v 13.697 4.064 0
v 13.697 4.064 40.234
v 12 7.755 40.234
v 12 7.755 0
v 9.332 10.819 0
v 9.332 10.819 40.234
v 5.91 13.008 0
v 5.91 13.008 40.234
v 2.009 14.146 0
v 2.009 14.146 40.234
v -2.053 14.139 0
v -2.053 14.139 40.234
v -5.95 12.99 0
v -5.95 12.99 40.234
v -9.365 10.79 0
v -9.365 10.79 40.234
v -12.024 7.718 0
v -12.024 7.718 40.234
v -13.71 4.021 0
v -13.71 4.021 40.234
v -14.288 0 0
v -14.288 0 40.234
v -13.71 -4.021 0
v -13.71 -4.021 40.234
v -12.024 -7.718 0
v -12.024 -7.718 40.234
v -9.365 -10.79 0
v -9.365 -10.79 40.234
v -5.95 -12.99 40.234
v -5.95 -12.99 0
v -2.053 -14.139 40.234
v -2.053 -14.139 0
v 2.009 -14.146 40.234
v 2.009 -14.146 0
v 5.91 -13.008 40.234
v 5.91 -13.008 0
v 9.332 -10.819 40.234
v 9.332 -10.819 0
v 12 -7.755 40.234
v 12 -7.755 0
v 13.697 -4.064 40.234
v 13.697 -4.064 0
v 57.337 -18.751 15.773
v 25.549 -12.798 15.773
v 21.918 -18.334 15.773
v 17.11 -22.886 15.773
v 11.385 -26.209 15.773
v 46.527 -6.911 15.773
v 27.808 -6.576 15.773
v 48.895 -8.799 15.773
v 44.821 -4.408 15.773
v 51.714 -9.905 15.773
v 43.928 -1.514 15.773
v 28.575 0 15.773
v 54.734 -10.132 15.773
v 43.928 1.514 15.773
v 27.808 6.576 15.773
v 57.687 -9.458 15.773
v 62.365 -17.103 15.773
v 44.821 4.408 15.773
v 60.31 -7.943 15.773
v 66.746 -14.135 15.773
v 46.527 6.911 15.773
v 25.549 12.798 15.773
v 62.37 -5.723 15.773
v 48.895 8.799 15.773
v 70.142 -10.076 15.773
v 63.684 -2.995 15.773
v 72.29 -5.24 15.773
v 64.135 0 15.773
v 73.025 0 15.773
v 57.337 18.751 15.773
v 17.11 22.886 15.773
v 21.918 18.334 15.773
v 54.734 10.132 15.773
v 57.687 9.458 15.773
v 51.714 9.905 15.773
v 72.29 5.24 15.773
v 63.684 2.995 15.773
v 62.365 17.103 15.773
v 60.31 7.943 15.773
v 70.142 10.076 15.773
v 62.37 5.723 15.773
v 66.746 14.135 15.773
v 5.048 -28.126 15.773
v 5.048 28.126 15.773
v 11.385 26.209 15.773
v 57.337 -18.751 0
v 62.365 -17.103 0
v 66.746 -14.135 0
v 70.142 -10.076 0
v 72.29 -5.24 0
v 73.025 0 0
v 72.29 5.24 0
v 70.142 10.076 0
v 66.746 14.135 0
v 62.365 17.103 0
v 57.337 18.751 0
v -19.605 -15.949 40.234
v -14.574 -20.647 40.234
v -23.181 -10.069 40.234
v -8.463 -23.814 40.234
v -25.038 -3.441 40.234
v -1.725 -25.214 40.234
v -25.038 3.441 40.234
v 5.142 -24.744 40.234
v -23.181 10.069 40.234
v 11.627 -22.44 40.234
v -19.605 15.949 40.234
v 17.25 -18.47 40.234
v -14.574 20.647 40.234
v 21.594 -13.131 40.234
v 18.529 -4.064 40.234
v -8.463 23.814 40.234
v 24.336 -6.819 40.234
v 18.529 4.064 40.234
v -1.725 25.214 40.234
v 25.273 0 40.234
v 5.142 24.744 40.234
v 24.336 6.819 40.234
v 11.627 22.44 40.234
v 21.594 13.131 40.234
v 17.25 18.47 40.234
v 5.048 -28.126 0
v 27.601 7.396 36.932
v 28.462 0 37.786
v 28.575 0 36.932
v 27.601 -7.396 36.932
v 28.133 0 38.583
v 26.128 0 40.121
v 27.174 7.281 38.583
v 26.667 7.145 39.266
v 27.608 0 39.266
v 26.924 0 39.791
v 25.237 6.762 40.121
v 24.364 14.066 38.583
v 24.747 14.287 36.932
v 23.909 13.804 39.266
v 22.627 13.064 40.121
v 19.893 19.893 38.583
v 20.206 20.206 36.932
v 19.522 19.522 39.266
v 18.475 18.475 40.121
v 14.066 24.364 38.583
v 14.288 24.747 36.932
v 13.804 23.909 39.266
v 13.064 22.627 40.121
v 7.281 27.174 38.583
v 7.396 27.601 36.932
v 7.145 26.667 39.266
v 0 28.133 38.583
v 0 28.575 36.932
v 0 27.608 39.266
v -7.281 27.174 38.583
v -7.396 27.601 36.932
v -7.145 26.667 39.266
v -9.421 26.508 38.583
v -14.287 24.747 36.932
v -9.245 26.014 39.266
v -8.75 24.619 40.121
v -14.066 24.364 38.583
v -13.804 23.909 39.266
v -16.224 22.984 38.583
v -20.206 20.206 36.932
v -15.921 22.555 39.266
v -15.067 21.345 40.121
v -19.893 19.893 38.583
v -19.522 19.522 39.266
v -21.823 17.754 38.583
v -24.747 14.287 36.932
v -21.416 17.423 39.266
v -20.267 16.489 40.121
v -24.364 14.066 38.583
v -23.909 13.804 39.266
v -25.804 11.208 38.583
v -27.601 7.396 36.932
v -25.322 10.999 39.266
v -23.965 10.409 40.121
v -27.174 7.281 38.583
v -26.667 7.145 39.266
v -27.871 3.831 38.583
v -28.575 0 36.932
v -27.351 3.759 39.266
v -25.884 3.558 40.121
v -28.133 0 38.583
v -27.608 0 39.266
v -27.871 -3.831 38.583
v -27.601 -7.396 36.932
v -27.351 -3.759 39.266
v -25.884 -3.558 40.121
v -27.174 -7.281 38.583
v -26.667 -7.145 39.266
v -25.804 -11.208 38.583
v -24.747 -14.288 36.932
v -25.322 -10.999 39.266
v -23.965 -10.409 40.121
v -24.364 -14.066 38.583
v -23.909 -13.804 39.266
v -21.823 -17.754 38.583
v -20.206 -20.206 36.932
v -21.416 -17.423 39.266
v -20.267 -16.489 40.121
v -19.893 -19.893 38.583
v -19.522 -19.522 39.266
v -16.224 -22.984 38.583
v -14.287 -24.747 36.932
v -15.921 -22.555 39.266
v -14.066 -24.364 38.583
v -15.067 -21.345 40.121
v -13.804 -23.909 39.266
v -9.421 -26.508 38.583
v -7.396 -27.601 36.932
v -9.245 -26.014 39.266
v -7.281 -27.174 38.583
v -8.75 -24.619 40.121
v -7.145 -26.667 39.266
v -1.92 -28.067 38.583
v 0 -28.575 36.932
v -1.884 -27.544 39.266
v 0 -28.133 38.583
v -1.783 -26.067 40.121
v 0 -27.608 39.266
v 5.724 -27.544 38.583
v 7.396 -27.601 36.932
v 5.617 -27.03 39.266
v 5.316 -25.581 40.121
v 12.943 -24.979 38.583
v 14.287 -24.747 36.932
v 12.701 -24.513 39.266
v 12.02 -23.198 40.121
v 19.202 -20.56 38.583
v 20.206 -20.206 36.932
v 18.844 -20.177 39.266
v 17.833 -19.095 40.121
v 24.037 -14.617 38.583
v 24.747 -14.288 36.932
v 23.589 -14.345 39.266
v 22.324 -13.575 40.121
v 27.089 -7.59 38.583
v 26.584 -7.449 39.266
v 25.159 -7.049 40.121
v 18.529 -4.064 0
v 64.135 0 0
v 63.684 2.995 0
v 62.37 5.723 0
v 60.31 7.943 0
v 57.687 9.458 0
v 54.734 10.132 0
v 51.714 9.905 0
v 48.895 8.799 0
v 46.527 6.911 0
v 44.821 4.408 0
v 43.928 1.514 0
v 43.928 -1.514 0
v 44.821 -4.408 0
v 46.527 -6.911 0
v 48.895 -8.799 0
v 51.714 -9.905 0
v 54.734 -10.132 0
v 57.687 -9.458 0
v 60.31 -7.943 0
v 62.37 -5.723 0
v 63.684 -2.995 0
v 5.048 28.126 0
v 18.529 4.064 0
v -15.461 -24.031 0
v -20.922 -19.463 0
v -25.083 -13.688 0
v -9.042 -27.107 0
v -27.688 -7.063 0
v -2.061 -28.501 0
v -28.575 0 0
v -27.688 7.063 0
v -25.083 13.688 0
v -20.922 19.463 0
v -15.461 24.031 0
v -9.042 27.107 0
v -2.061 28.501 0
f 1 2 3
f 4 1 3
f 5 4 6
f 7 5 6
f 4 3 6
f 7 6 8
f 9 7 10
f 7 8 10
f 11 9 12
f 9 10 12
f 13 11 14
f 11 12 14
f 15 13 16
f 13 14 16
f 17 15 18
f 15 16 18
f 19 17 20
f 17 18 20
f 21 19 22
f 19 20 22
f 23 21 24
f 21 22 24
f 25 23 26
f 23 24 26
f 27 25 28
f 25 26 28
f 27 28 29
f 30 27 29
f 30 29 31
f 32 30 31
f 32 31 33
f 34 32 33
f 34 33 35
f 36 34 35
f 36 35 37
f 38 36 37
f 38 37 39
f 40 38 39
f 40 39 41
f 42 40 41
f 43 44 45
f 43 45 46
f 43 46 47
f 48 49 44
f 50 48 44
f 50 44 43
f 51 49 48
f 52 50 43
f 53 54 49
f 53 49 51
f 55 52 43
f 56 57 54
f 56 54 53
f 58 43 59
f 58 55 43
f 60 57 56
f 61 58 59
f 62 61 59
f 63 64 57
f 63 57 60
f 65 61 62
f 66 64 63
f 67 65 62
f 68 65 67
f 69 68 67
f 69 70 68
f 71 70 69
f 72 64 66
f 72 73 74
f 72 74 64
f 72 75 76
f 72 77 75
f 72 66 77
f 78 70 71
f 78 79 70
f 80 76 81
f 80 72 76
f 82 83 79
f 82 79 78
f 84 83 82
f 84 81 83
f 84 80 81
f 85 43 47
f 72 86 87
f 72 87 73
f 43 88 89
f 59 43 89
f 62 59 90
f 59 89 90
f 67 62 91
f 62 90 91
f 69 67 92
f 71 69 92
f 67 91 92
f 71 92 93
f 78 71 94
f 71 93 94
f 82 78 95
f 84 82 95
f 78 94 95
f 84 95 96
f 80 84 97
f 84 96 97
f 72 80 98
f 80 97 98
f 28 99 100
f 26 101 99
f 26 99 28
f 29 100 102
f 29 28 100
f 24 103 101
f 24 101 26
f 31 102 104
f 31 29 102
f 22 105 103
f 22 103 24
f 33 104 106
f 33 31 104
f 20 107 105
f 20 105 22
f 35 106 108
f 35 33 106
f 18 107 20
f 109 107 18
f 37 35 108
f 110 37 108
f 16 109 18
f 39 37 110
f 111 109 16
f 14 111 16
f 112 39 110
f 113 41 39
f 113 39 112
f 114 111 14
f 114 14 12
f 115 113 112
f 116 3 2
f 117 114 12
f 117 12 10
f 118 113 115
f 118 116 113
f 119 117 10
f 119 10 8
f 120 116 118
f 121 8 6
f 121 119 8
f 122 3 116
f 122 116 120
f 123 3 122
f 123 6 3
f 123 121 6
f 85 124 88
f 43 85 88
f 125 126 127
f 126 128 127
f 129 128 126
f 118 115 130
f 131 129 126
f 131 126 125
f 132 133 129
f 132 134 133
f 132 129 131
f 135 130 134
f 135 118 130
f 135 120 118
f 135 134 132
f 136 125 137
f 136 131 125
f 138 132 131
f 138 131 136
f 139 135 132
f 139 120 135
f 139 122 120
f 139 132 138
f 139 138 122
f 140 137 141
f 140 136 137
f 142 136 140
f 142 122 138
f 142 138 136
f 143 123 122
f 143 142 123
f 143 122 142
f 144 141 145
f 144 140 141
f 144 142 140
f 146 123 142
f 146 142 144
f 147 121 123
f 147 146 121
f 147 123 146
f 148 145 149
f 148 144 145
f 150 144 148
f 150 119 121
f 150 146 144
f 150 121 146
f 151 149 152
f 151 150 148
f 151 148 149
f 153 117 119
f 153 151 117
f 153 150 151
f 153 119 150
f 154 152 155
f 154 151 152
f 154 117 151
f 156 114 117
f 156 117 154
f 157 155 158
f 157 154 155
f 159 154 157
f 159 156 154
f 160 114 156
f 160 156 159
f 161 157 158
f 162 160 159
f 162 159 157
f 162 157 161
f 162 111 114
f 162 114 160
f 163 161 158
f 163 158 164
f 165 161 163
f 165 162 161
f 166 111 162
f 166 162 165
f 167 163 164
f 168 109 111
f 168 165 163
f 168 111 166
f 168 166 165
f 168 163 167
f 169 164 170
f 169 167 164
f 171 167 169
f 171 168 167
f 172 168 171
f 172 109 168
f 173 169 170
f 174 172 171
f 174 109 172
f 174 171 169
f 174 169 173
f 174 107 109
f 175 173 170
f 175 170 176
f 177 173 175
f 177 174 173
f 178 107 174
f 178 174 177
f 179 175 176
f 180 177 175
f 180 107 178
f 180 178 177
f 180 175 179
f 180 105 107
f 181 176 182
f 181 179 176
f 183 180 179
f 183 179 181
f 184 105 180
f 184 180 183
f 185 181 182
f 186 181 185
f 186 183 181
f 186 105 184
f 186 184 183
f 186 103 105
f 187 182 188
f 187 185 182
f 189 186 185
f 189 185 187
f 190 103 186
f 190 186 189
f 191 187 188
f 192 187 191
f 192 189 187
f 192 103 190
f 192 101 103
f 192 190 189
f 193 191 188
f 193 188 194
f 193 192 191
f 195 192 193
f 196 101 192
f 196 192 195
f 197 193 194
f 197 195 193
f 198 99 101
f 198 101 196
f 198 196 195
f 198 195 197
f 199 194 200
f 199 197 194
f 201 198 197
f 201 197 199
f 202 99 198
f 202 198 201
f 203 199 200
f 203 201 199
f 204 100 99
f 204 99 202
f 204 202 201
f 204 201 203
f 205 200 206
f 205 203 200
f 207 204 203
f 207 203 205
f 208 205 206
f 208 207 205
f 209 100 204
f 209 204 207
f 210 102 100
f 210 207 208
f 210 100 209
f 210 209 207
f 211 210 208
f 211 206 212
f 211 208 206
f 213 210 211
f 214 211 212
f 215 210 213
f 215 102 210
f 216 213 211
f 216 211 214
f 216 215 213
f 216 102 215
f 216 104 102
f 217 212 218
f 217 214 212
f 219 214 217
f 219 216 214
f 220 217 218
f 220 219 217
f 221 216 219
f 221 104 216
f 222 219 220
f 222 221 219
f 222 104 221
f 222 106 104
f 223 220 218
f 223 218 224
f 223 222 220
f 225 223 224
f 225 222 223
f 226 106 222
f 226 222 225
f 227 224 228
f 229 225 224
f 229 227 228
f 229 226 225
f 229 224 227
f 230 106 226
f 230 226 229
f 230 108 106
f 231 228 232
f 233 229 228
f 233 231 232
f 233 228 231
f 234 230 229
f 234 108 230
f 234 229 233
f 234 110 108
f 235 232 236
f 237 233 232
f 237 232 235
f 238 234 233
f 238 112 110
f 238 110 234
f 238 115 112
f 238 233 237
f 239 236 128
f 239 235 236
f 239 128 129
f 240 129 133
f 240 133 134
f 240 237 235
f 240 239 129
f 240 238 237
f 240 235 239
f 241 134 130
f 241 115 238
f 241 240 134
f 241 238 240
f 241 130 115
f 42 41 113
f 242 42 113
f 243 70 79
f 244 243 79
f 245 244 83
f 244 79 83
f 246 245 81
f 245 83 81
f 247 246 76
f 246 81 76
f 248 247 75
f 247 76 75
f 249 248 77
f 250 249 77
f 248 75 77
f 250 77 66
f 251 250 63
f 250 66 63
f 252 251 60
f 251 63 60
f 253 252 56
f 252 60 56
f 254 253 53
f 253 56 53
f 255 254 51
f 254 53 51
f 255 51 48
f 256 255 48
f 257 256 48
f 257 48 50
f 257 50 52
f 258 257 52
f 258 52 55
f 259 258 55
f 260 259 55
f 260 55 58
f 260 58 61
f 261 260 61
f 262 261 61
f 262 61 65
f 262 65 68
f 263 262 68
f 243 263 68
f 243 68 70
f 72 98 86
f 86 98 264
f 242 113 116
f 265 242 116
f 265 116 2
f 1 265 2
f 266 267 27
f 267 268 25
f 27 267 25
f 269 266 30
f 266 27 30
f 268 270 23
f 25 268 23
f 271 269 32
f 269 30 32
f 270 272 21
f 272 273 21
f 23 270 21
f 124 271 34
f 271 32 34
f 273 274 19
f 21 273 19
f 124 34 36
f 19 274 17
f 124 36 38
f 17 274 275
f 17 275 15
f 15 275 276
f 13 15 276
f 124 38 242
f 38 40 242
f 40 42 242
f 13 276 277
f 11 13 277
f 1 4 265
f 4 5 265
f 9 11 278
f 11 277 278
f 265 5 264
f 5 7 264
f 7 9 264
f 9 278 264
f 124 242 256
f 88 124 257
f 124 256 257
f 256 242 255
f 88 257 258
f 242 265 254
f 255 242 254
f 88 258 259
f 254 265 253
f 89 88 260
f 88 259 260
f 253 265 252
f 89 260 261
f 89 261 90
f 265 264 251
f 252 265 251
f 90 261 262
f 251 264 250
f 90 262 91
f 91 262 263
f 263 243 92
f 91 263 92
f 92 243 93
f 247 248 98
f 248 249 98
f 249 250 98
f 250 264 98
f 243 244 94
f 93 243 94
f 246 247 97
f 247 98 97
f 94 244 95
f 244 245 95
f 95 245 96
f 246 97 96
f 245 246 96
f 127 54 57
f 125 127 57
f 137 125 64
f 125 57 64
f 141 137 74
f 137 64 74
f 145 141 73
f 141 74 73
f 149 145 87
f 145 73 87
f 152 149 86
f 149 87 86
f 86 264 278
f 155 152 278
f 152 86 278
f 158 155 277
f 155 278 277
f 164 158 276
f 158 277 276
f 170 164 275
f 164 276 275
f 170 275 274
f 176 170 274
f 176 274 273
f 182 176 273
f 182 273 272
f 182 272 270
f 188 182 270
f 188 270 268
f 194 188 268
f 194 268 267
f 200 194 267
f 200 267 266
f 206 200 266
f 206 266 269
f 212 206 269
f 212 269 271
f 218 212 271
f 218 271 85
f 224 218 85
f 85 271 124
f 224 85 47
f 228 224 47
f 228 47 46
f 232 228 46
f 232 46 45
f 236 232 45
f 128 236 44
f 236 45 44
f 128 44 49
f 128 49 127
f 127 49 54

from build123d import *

# Parameters (mm, degrees)
F0_R     = 28.575
F1_DEPTH = 40.2336
F3_DEPTH = 15.7734
F5_DEPTH = 40.2346
F6_R     = 10.16
F7_DEPTH = 15.7744
F8_R     = 3.302


with BuildPart() as f1:
    # F0 (on Top) → F1 (new body)
    with BuildSketch(Plane.XY):
        Circle(F0_R)
    extrude(amount=F1_DEPTH)

    # F2 (on Top) → F3 (join)
    with BuildSketch(Plane.XY):
        with BuildLine():
            Line((5.042647, -28.126541), (57.336765, -18.751028))
            ThreePointArc((57.336765, -18.751028), (73.025, 0), (57.336765, 18.751028))
            Line((57.336765, 18.751028), (5.042647, 28.126541))
            ThreePointArc((5.042647, 28.126541), (-28.575, 0), (5.042647, -28.126541))
        make_face()
    extrude(amount=F3_DEPTH)

    # F4 (on face) → F5 (cut, through all)
    with BuildSketch(Plane.XY.offset(40.2336)):
        with BuildLine():
            Line((18.5293, 4.064), (13.697319, 4.064))
            ThreePointArc((13.697319, 4.064), (-14.2875, 0), (13.697319, -4.064))
            Line((13.697319, -4.064), (18.5293, -4.064))
            Line((18.5293, -4.064), (18.5293, 0))
            Line((18.5293, 0), (18.5293, 4.064))
        make_face()
    extrude(amount=-F5_DEPTH, mode=Mode.SUBTRACT)

    # F6 (on face) → F7 (cut, through all)
    with BuildSketch(Plane.XY.offset(15.7734)):
        with Locations((53.975, 0)):
            Circle(F6_R)
    extrude(amount=-F7_DEPTH, mode=Mode.SUBTRACT)

    # F8
    f8_edges = [f1.edges().sort_by_distance(p)[0] for p in [
        (-28.575, 0, 40.2336),
    ]]
    fillet(f8_edges, radius=F8_R)


solid = f1.part
